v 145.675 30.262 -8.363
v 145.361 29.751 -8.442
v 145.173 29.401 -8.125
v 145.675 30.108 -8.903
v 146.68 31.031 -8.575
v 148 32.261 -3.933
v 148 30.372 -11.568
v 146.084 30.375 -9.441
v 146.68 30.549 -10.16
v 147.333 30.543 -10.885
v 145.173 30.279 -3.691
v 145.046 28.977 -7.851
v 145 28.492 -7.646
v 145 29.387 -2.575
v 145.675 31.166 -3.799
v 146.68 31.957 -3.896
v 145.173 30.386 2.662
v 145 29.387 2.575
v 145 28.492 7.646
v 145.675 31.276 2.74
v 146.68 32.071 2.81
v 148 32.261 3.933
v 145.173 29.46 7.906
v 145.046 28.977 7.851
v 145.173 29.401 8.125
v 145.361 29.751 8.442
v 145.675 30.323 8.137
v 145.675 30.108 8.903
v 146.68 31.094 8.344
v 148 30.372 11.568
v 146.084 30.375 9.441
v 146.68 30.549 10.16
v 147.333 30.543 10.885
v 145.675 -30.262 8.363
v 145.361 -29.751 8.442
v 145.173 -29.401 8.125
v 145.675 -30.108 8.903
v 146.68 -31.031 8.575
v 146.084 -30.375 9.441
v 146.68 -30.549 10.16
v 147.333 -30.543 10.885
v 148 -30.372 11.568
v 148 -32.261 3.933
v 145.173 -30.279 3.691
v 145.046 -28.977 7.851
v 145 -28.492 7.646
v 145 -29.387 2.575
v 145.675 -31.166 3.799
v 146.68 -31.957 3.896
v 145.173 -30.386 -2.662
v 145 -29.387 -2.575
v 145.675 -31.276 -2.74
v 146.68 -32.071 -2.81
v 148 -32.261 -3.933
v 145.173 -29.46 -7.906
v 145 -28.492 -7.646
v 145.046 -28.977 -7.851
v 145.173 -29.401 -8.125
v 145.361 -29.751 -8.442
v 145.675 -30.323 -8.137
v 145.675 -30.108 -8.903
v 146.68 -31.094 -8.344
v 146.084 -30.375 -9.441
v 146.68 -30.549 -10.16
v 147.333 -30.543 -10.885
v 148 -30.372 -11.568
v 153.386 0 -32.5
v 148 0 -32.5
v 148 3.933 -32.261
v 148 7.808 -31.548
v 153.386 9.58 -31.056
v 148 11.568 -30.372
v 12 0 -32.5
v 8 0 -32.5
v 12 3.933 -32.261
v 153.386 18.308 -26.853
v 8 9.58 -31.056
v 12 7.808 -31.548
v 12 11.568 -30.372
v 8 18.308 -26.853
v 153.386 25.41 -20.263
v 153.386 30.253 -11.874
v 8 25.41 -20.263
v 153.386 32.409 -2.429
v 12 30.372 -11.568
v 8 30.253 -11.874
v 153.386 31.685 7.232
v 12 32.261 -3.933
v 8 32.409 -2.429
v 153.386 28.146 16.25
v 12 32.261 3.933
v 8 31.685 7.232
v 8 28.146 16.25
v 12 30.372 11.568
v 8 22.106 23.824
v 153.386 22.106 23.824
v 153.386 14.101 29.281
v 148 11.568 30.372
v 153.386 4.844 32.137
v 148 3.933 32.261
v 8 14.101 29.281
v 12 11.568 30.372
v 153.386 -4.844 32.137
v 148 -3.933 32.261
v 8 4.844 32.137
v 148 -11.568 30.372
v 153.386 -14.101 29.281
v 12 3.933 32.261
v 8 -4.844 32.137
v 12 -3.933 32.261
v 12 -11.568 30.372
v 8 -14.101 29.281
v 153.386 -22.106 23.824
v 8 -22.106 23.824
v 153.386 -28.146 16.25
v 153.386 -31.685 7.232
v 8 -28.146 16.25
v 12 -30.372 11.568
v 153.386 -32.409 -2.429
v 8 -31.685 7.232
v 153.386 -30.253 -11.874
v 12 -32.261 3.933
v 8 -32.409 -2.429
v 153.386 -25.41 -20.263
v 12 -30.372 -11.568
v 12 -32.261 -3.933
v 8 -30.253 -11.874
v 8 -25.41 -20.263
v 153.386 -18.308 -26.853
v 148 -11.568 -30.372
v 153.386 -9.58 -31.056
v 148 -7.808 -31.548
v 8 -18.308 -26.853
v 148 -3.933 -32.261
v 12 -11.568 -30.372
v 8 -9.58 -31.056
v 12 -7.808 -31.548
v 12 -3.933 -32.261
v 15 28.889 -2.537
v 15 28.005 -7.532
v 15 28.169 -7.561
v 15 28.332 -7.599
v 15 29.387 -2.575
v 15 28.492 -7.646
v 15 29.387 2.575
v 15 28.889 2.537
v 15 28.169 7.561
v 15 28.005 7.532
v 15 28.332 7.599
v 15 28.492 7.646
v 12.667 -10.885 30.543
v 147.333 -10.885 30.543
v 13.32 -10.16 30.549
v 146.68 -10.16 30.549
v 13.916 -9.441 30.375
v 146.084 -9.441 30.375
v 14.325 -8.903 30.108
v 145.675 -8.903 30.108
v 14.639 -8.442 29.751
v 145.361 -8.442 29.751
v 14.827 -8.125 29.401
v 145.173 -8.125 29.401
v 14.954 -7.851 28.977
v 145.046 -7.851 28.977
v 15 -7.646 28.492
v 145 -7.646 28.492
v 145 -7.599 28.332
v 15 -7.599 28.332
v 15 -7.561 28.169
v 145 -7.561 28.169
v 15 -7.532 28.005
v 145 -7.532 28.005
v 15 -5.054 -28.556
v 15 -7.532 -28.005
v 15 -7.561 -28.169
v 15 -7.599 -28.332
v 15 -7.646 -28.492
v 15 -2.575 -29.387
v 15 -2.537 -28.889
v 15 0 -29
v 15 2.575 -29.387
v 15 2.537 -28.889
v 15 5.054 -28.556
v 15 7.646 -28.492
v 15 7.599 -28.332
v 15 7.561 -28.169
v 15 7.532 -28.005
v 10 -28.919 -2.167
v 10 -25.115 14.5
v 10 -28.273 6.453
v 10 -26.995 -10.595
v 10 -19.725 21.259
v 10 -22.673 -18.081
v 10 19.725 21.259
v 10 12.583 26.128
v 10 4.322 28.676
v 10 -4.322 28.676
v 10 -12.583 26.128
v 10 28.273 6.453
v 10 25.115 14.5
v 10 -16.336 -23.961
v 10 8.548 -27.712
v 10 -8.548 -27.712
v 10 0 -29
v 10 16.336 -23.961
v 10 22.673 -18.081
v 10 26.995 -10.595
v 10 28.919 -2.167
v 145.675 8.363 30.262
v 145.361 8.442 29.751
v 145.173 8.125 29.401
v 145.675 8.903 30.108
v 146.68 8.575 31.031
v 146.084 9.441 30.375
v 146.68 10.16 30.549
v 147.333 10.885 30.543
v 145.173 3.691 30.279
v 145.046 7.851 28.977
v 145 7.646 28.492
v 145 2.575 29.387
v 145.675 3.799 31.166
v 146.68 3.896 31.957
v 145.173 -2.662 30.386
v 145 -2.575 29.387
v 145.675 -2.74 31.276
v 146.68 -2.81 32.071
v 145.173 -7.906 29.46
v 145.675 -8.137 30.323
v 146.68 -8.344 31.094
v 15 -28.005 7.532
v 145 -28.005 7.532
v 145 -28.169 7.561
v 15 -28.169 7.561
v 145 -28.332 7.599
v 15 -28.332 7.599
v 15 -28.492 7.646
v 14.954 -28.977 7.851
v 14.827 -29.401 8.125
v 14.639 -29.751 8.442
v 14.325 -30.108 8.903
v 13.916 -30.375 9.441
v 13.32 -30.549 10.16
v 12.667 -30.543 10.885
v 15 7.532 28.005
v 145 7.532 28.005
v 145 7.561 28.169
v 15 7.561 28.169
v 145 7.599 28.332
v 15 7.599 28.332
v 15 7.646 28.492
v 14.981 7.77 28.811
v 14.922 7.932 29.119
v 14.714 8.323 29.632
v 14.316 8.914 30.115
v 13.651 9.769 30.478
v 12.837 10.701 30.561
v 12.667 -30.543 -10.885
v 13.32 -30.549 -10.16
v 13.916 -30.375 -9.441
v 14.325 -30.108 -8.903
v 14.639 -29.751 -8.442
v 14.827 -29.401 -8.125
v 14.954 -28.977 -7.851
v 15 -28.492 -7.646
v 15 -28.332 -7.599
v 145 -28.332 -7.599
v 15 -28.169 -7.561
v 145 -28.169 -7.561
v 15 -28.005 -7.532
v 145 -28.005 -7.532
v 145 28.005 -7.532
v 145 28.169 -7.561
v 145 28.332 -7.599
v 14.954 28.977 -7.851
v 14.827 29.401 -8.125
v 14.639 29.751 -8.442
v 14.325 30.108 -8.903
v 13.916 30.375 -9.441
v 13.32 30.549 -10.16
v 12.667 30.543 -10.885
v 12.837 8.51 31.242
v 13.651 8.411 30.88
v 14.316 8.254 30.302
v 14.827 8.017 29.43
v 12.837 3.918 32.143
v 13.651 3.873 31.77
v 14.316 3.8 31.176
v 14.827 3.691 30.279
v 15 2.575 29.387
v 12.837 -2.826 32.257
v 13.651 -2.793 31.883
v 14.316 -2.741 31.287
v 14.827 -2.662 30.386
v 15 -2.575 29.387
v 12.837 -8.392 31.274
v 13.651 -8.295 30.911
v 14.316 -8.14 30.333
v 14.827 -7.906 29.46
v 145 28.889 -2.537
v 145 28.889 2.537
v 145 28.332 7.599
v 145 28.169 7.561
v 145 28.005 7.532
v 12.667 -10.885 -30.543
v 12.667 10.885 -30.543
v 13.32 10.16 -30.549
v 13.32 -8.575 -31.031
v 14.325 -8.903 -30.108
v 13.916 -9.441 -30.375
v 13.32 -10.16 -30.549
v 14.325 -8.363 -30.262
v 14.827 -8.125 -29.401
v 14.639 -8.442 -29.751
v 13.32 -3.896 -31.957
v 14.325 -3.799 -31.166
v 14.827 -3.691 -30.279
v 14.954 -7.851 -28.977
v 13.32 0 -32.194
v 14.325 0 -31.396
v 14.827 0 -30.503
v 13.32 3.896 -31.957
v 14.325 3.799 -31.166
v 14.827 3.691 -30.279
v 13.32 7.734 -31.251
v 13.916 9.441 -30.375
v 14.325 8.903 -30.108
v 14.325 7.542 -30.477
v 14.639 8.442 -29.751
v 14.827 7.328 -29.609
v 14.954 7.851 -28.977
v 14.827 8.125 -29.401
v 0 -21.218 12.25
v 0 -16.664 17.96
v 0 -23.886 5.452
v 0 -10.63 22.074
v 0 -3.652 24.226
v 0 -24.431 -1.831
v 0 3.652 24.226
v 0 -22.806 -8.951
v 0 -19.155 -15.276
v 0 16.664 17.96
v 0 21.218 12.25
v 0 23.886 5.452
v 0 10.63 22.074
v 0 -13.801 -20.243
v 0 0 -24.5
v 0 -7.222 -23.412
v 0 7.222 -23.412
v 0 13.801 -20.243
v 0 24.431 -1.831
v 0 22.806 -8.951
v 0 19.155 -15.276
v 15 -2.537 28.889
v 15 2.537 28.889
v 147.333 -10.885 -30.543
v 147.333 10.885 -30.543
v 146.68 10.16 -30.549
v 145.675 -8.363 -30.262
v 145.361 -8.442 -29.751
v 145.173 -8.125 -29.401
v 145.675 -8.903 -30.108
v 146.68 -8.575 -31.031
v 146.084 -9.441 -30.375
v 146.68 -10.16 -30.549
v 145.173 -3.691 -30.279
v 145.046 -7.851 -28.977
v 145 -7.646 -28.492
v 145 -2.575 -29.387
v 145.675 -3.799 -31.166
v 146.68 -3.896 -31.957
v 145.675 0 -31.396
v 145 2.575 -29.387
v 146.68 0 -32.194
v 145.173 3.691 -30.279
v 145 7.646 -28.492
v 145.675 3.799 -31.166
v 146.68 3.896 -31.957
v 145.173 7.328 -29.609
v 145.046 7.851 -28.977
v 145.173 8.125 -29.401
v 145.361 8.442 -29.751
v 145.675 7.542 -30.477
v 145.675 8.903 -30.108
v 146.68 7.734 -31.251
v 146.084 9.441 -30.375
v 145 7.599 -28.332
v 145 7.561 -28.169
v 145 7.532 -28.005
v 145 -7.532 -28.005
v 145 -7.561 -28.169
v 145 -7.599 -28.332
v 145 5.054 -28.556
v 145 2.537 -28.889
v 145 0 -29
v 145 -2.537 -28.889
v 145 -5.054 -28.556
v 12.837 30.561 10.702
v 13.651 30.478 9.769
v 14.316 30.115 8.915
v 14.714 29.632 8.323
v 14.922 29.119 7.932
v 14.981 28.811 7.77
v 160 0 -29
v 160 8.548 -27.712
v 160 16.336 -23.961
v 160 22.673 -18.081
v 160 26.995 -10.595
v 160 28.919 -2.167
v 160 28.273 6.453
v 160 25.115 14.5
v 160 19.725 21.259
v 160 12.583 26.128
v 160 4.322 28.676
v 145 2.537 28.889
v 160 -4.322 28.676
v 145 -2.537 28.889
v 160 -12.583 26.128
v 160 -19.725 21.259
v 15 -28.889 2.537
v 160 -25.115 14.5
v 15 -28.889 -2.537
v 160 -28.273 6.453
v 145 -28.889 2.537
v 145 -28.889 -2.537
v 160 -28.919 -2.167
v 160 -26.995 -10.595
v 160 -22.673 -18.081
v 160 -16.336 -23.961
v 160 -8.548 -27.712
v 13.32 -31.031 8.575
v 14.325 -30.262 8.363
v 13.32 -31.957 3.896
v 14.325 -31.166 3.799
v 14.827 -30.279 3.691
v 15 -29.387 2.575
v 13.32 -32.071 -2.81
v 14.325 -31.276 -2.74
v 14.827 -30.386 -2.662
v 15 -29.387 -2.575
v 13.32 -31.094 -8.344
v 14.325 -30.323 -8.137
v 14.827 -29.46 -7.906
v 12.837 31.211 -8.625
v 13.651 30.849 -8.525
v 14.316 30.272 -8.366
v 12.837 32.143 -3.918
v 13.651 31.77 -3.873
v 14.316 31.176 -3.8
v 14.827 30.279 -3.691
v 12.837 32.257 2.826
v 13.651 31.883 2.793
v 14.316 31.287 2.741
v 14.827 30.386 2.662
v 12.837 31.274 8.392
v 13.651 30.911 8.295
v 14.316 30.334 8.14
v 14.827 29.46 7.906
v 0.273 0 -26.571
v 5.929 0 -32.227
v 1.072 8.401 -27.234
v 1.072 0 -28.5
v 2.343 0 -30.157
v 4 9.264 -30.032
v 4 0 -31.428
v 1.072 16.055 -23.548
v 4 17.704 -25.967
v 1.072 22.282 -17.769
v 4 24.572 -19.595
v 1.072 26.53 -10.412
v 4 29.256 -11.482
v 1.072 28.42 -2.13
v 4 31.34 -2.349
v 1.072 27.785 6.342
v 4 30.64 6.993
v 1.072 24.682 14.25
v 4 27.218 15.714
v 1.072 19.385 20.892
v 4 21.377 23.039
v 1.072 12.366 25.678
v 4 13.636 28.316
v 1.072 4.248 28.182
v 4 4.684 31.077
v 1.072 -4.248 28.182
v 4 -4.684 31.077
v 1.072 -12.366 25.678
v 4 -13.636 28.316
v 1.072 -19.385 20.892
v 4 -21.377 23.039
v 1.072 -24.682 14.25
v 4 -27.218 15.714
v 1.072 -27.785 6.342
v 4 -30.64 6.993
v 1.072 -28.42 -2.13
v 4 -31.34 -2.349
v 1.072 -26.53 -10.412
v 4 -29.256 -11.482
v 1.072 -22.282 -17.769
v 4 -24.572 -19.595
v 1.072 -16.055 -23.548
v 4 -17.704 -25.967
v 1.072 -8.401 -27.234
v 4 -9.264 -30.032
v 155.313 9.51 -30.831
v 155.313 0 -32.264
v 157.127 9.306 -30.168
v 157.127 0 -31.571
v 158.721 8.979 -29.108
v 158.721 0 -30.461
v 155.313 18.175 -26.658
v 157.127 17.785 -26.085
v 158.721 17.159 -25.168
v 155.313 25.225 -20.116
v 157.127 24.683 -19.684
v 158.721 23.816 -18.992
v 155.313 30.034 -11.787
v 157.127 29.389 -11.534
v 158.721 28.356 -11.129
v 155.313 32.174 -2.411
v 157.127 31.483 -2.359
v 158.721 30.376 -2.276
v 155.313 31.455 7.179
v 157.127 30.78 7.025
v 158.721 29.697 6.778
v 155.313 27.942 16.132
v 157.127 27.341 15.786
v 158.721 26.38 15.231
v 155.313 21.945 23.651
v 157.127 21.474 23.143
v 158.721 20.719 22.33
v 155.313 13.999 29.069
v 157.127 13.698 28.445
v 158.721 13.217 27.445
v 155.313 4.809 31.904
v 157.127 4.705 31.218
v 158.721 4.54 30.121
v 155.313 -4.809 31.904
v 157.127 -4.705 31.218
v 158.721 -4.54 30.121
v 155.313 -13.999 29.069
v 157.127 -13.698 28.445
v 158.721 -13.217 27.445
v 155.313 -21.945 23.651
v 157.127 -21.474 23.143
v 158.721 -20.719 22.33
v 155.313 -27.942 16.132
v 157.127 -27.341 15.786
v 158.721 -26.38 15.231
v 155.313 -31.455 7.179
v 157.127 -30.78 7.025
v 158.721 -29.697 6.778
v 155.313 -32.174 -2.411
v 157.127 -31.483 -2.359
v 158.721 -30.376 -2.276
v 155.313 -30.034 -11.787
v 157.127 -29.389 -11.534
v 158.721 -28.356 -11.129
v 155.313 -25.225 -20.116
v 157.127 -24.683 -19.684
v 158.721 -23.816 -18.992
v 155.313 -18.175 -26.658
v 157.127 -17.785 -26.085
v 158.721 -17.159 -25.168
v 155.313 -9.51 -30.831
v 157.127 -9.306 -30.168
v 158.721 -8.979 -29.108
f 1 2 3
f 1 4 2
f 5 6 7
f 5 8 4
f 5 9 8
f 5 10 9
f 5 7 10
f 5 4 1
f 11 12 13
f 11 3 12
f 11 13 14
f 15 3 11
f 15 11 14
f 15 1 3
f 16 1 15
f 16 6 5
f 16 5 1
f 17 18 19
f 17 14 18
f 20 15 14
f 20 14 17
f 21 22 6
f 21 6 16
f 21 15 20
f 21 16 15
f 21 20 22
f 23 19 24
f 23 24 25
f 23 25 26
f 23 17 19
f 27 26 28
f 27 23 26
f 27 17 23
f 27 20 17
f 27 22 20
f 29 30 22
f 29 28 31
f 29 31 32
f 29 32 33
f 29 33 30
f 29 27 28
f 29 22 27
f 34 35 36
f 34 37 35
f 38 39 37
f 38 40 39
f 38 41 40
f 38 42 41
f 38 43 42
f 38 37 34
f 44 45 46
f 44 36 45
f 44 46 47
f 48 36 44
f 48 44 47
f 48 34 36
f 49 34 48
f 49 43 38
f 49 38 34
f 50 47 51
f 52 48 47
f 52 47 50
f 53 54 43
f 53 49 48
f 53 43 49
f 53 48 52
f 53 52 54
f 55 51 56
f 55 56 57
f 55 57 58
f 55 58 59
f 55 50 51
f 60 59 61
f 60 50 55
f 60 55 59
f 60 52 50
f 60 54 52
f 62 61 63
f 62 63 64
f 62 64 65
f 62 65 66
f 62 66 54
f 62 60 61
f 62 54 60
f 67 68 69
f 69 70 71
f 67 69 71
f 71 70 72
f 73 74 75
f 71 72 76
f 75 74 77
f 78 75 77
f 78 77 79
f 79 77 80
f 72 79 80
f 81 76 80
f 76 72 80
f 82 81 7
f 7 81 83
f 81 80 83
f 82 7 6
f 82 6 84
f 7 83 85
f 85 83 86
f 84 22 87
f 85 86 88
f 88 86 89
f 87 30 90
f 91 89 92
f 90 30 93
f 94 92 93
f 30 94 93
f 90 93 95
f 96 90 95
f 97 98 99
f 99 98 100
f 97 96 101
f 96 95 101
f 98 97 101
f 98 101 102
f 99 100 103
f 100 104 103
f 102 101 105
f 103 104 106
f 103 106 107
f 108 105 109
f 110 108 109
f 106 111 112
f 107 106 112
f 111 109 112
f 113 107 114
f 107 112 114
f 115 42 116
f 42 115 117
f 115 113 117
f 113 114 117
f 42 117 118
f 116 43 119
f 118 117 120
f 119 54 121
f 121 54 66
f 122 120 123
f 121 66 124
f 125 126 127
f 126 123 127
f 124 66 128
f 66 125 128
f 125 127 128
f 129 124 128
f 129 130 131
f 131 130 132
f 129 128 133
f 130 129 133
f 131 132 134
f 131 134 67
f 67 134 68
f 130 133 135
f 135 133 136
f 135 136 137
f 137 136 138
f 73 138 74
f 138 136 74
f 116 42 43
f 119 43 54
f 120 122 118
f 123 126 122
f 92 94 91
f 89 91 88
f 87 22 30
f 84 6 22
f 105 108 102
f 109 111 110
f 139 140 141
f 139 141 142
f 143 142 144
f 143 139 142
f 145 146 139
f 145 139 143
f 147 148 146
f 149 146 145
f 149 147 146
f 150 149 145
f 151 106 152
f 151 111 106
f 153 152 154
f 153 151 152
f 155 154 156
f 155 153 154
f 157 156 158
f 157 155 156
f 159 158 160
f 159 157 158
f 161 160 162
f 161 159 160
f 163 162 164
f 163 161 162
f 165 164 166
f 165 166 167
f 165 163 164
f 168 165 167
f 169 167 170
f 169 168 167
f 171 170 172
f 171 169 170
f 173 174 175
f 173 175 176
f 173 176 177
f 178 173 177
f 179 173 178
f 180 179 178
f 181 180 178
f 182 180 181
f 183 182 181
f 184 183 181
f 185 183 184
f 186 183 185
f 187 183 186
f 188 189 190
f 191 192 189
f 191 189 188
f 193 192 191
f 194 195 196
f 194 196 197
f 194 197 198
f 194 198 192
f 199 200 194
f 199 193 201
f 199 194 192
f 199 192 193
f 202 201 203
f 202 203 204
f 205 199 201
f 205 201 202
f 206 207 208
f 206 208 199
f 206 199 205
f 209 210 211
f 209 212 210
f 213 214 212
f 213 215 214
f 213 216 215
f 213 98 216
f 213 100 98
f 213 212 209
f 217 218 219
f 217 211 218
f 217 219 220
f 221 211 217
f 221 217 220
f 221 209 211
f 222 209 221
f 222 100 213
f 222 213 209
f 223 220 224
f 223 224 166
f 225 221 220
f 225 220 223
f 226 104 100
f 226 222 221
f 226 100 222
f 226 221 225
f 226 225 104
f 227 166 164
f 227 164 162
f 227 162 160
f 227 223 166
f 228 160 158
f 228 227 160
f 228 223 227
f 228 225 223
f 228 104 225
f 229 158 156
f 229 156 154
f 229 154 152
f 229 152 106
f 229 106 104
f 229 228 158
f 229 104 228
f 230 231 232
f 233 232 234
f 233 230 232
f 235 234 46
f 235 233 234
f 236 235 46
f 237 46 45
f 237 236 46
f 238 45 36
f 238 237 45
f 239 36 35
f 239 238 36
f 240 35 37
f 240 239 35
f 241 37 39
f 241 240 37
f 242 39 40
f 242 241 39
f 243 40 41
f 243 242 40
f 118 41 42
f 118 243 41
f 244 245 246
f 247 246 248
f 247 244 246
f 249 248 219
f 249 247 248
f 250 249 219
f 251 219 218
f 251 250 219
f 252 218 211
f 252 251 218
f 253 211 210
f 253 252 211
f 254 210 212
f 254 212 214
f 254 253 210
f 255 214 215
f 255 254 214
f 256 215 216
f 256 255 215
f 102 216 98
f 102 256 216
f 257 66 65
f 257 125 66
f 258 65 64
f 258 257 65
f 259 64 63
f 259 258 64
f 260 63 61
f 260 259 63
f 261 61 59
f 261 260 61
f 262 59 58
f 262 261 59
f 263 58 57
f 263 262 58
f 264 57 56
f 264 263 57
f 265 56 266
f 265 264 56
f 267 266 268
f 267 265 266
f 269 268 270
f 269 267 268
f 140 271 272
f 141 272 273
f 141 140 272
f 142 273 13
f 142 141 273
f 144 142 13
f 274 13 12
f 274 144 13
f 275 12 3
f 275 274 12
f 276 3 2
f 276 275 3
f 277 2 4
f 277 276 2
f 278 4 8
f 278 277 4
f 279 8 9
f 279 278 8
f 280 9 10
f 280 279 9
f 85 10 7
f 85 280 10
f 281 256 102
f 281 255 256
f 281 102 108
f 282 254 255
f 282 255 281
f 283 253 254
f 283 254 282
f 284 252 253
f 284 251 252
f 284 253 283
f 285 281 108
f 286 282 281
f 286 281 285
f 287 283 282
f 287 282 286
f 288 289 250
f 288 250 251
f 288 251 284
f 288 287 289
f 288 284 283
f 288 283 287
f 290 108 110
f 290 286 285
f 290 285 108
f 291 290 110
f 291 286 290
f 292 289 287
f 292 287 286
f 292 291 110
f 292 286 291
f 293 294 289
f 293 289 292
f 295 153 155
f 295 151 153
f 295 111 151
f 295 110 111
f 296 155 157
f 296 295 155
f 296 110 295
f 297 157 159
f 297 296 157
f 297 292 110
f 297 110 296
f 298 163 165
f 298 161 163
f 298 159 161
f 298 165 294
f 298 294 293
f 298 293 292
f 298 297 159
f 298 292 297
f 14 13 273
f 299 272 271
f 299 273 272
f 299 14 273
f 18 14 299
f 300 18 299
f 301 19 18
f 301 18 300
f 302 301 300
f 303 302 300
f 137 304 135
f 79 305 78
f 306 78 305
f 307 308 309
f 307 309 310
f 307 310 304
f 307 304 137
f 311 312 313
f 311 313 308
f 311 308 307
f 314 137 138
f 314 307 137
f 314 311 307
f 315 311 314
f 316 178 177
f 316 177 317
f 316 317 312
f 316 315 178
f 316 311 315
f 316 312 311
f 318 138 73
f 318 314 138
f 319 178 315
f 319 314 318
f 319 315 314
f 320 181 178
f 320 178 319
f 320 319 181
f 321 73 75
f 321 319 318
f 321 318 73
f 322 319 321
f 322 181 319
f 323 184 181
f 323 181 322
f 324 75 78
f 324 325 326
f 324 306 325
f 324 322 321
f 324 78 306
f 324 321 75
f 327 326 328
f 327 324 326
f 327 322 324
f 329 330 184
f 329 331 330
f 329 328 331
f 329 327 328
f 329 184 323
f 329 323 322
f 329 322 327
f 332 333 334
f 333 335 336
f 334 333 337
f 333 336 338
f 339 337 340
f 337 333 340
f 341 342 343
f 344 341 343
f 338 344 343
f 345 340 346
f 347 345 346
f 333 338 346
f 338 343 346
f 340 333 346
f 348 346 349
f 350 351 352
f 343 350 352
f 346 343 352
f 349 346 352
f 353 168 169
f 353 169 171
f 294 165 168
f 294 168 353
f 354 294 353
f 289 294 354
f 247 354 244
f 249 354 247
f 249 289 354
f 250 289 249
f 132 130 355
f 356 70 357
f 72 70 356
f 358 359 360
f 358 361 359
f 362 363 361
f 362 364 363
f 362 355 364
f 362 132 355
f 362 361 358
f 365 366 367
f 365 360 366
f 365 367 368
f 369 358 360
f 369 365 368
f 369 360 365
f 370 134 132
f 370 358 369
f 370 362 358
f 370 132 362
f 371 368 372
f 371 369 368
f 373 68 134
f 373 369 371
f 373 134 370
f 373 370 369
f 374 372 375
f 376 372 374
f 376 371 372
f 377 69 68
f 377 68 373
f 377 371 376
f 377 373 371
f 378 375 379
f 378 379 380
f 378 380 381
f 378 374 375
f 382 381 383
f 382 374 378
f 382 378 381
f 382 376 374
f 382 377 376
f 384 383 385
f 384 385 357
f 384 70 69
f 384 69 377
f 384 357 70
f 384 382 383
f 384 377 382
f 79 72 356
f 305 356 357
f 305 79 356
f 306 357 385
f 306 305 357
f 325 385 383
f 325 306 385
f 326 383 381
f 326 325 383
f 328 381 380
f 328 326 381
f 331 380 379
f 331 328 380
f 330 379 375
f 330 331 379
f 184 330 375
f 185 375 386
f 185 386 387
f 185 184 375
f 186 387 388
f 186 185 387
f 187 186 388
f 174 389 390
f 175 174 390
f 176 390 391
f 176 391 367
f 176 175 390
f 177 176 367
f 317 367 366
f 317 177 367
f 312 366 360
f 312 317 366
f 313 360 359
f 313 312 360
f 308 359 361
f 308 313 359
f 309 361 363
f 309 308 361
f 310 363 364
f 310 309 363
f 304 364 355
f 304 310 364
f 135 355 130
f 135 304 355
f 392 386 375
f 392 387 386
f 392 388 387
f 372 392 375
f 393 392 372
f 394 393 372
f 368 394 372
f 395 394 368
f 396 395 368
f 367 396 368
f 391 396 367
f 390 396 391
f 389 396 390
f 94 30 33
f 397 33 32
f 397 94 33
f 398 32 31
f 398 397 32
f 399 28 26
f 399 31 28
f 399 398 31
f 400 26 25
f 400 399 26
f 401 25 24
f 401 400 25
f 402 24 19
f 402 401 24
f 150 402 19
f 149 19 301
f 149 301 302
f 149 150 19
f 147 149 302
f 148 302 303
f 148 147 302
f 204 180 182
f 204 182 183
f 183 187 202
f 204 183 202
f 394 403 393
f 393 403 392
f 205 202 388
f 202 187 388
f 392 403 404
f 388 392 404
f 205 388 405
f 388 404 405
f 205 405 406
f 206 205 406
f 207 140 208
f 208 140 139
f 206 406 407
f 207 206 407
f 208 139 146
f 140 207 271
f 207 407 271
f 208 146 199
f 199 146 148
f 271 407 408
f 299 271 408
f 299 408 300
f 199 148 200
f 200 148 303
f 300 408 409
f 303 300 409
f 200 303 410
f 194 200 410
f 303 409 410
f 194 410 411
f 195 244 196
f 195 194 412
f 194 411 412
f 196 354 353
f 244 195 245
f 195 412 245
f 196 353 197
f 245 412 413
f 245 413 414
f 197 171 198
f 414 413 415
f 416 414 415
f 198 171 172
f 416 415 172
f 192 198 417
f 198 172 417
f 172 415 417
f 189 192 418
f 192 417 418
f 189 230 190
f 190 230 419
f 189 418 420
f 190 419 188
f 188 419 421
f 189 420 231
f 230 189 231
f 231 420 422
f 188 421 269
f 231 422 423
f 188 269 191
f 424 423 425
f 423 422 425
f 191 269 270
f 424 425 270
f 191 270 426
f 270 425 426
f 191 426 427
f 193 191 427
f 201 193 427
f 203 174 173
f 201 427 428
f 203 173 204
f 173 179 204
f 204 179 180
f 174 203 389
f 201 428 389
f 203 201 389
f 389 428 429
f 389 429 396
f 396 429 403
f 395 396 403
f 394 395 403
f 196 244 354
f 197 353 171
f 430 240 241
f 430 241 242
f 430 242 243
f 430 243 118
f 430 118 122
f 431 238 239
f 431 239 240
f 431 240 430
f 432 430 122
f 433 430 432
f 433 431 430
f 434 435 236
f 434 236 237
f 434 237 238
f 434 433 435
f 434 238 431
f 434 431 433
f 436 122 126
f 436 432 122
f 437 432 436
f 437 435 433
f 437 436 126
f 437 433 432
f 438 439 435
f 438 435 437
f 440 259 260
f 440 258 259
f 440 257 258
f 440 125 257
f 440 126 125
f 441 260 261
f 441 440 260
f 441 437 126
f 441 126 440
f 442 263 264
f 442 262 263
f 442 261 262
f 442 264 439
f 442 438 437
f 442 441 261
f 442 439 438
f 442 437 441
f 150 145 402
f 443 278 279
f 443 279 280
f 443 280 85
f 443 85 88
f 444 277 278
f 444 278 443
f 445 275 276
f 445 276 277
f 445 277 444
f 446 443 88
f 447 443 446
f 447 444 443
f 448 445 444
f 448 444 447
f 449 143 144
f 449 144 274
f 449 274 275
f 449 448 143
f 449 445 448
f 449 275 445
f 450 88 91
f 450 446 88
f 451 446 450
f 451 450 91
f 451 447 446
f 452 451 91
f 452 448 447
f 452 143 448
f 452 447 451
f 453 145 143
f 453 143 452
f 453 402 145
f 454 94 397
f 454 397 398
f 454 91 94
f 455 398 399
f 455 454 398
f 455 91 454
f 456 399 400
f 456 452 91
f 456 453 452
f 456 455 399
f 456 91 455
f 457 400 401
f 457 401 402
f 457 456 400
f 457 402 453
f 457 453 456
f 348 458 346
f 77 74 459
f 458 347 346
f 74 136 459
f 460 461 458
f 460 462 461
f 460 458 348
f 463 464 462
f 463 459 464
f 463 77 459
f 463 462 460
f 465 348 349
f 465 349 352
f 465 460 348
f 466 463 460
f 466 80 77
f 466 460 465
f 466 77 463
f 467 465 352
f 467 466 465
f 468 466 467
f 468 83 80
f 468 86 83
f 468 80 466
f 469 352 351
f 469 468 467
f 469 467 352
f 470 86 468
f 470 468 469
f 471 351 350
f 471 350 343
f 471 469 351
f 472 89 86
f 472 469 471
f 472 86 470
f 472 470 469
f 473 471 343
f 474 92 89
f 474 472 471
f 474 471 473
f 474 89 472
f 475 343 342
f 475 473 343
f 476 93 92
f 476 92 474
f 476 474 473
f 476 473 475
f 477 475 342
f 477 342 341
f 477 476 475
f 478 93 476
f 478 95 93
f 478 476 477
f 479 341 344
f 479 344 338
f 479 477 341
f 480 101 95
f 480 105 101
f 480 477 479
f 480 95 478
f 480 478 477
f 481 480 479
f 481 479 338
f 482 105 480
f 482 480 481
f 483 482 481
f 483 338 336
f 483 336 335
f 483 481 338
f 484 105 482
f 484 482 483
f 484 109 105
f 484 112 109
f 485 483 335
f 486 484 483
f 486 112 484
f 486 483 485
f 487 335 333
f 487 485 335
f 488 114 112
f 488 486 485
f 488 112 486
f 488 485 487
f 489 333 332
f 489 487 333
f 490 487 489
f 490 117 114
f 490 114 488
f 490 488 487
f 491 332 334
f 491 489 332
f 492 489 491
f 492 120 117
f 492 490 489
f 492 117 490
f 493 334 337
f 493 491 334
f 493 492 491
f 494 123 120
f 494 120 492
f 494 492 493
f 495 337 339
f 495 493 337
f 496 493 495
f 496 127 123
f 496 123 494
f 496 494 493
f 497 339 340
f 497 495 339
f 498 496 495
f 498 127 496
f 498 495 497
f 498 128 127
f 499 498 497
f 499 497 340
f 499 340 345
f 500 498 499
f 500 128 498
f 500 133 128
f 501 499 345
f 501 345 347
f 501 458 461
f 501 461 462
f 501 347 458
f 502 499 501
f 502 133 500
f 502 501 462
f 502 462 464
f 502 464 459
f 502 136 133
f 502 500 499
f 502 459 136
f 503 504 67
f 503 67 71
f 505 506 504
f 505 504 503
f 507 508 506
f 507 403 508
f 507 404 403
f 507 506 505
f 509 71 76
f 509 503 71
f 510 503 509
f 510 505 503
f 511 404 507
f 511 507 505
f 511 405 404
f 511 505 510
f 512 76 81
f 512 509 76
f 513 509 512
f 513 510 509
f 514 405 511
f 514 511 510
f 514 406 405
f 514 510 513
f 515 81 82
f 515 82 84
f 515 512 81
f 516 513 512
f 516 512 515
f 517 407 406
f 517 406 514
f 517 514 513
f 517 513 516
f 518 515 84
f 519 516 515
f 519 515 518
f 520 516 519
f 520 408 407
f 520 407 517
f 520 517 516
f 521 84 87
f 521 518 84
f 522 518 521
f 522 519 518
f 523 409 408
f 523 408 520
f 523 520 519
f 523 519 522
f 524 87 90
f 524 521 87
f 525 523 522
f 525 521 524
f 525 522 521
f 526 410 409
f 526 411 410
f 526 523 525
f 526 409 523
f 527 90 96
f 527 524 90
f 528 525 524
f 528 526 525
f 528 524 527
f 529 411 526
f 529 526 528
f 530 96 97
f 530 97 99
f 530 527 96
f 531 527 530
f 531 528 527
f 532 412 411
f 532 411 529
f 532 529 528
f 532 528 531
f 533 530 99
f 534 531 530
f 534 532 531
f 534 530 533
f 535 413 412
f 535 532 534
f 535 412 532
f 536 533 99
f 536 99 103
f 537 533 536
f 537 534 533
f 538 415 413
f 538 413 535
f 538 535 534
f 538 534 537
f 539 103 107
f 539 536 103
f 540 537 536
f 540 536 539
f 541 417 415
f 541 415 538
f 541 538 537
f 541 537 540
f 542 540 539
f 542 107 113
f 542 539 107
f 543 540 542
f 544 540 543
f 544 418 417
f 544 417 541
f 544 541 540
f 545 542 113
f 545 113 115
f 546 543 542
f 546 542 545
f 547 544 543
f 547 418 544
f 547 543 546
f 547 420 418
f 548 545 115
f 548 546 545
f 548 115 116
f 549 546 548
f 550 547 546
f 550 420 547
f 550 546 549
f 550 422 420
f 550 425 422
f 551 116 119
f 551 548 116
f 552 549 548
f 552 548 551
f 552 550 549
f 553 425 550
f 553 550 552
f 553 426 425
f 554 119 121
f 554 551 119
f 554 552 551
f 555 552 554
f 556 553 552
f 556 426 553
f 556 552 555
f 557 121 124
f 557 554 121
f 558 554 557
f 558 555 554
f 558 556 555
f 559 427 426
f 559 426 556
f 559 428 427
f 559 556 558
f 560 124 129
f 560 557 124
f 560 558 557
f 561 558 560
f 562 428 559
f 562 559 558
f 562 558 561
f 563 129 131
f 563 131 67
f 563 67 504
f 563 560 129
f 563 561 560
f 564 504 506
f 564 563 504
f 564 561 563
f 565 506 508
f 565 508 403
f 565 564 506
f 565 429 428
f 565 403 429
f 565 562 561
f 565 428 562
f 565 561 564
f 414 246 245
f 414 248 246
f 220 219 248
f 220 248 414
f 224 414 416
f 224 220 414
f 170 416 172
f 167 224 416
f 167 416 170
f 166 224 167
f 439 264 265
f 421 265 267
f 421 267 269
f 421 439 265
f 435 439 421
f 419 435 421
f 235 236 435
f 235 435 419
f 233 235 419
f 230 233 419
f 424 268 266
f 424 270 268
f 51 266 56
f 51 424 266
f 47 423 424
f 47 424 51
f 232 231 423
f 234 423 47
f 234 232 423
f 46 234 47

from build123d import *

# Parameters (mm, degrees)
SKETCH2_R               = 32.5
BOSS_EXTRUDE1_DEPTH     = 160
CUT_EXTRUDE2_DEPTH      = 50
CUT_EXTRUDE2_DEPTH_BACK = 50
SKETCH4_W               = 130
SKETCH4_H               = 15
CUT_EXTRUDE3_DEPTH      = 50
CUT_EXTRUDE3_DEPTH_BACK = 50
SKETCH5_W               = 130
SKETCH5_H               = 15
FILLET2_START           = 11.9999999
FILLET2_DEPTH           = 136.0000002
SKETCH6_R               = 29
CUT_EXTRUDE4_DEPTH      = 160
FILLET3_R               = 8


with BuildPart() as part:
    # Sketch2 → Boss-Extrude1 (new body)
    with BuildSketch(Plane(origin=(0, 0, 0), x_dir=(0, 0, -1), z_dir=(1, 0, 0))):
        Circle(SKETCH2_R)
    extrude(amount=BOSS_EXTRUDE1_DEPTH)

    # Sketch4 → Cut-Extrude2 (cut, two sides: drawn at the far end of the back side and taken through both)
    with BuildSketch(Plane.XY.offset(-CUT_EXTRUDE2_DEPTH_BACK)):
        with Locations((80, 0)):
            Rectangle(SKETCH4_W, SKETCH4_H)
    extrude(amount=CUT_EXTRUDE2_DEPTH + CUT_EXTRUDE2_DEPTH_BACK, mode=Mode.SUBTRACT)

    # Sketch5 → Cut-Extrude3 (cut, two sides: drawn at the far end of the back side and taken through both)
    with BuildSketch(Plane(origin=(0, 0, 0), x_dir=(1, 0, 0), z_dir=(0, 1, 0)).offset(-CUT_EXTRUDE3_DEPTH_BACK)):
        with Locations((80, 0)):
            Rectangle(SKETCH5_W, SKETCH5_H)
    extrude(amount=CUT_EXTRUDE3_DEPTH + CUT_EXTRUDE3_DEPTH_BACK, mode=Mode.SUBTRACT)

    # Fillet2: read off the stored shape, not the designer's step
    # Fillet2 outline → Fillet2 (cut)
    with BuildSketch(Plane.YZ.offset(FILLET2_START)):
        with BuildLine():
            ThreePointArc((-30.371632844, 11.56779661), (-32.5, 0), (-30.371632844, -11.56779661))
            ThreePointArc((-30.371632844, -11.56779661), (-30.038258413, -8.79755908), (-27.568097504, -7.5))
            Line((-27.568097504, -7.5), (-7.5, -7.5))
            Line((-7.5, -7.5), (-7.5, -27.568097504))
            ThreePointArc((-7.5, -27.568097504), (-8.79755908, -30.038258413), (-11.56779661, -30.371632844))
            ThreePointArc((-11.56779661, -30.371632844), (0, -32.5), (11.56779661, -30.371632844))
            ThreePointArc((11.56779661, -30.371632844), (8.79755908, -30.038258413), (7.5, -27.568097504))
            Line((7.5, -27.568097504), (7.5, -7.5))
            Line((7.5, -7.5), (27.568097504, -7.5))
            ThreePointArc((27.568097504, -7.5), (30.038258413, -8.79755908), (30.371632844, -11.56779661))
            ThreePointArc((30.371632844, -11.56779661), (32.5, 0), (30.371632844, 11.56779661))
            ThreePointArc((30.371632844, 11.56779661), (30.038258413, 8.79755908), (27.568097504, 7.5))
            Line((27.568097504, 7.5), (7.5, 7.5))
            Line((7.5, 7.5), (7.5, 27.568097504))
            ThreePointArc((7.5, 27.568097504), (8.79755908, 30.038258413), (11.56779661, 30.371632844))
            ThreePointArc((11.56779661, 30.371632844), (0, 32.5), (-11.56779661, 30.371632844))
            ThreePointArc((-11.56779661, 30.371632844), (-8.79755908, 30.038258413), (-7.5, 27.568097504))
            Line((-7.5, 27.568097504), (-7.5, 7.5))
            Line((-7.5, 7.5), (-27.568097504, 7.5))
            ThreePointArc((-27.568097504, 7.5), (-30.038258413, 8.79755908), (-30.371632844, 11.56779661))
        make_face()
    extrude(amount=FILLET2_DEPTH, mode=Mode.SUBTRACT)

    # Fillet2 2 outline → Fillet2 2 (revolve)
    with BuildSketch(Plane.YX):
        with BuildLine():
            Line((0, 148.0000001), (0, 145))
            Line((0, 145), (29.5, 145))
            ThreePointArc((29.5, 145), (31.621320344, 145.878679656), (32.5, 148))
            Line((32.5, 148), (0, 148.0000001))
        make_face()
        with BuildLine():
            Line((29.5, 15), (0, 15))
            Line((0, 15), (0, 11.9999999))
            Line((0, 11.9999999), (32.5, 12))
            ThreePointArc((32.5, 12), (31.621320344, 14.121320344), (29.5, 15))
        make_face()
    revolve(axis=Axis((0, 0, 0), (1, 0, 0)))

    # Sketch6 → Cut-Extrude4 (cut)
    with BuildSketch(Plane(origin=(170, 0, 0), x_dir=(0, 0, -1), z_dir=(1, 0, 0))):
        Circle(SKETCH6_R)
    extrude(amount=-CUT_EXTRUDE4_DEPTH, mode=Mode.SUBTRACT)

    # Fillet3
    # the kernel refuses this fillet: 8 mm, written as the material it takes off along each edge
    with BuildSketch(Plane(origin=(0, 0, 0), x_dir=(0, 0, -1), z_dir=(0, -1, 0))) as fillet3_piece_1:
        with BuildLine():
            CenterArc((32.5 - FILLET3_R, FILLET3_R), FILLET3_R, 270, 90)
            Line((32.5 - FILLET3_R, 0), (32.5 - FILLET3_R, -FILLET3_R * 0.02))
            Line((32.5 - FILLET3_R, -FILLET3_R * 0.02), (32.5 + FILLET3_R * 0.02, -FILLET3_R * 0.02))
            Line((32.5 + FILLET3_R * 0.02, -FILLET3_R * 0.02), (32.5 + FILLET3_R * 0.02, FILLET3_R))
            Line((32.5 + FILLET3_R * 0.02, FILLET3_R), (32.5, FILLET3_R))
        make_face()
    revolve(axis=Axis((0, 0, 0), (1, 0, 0)), mode=Mode.SUBTRACT)
    with BuildSketch(Plane(origin=(160, 0, 0), x_dir=(0, 0, -1), z_dir=(0, -1, 0))) as fillet3_piece_2:
        with BuildLine():
            CenterArc((24.5, -6.614378278), FILLET3_R, 0, 55.771133672)
            Line((29, 0), (29.09, 0.132287566))
            ThreePointArc((29.09, 0.132287566), (30.75, 0.16), (32.5, 0.16))
            Line((32.5, 0.16), (32.66, 0))
            Line((32.66, 0), (32.66, -6.614378278))
            Line((32.66, -6.614378278), (32.5, -6.614378278))
        make_face()
    revolve(axis=Axis((160, 0, 0), (1, 0, 0)), mode=Mode.SUBTRACT)


solid = part.part
